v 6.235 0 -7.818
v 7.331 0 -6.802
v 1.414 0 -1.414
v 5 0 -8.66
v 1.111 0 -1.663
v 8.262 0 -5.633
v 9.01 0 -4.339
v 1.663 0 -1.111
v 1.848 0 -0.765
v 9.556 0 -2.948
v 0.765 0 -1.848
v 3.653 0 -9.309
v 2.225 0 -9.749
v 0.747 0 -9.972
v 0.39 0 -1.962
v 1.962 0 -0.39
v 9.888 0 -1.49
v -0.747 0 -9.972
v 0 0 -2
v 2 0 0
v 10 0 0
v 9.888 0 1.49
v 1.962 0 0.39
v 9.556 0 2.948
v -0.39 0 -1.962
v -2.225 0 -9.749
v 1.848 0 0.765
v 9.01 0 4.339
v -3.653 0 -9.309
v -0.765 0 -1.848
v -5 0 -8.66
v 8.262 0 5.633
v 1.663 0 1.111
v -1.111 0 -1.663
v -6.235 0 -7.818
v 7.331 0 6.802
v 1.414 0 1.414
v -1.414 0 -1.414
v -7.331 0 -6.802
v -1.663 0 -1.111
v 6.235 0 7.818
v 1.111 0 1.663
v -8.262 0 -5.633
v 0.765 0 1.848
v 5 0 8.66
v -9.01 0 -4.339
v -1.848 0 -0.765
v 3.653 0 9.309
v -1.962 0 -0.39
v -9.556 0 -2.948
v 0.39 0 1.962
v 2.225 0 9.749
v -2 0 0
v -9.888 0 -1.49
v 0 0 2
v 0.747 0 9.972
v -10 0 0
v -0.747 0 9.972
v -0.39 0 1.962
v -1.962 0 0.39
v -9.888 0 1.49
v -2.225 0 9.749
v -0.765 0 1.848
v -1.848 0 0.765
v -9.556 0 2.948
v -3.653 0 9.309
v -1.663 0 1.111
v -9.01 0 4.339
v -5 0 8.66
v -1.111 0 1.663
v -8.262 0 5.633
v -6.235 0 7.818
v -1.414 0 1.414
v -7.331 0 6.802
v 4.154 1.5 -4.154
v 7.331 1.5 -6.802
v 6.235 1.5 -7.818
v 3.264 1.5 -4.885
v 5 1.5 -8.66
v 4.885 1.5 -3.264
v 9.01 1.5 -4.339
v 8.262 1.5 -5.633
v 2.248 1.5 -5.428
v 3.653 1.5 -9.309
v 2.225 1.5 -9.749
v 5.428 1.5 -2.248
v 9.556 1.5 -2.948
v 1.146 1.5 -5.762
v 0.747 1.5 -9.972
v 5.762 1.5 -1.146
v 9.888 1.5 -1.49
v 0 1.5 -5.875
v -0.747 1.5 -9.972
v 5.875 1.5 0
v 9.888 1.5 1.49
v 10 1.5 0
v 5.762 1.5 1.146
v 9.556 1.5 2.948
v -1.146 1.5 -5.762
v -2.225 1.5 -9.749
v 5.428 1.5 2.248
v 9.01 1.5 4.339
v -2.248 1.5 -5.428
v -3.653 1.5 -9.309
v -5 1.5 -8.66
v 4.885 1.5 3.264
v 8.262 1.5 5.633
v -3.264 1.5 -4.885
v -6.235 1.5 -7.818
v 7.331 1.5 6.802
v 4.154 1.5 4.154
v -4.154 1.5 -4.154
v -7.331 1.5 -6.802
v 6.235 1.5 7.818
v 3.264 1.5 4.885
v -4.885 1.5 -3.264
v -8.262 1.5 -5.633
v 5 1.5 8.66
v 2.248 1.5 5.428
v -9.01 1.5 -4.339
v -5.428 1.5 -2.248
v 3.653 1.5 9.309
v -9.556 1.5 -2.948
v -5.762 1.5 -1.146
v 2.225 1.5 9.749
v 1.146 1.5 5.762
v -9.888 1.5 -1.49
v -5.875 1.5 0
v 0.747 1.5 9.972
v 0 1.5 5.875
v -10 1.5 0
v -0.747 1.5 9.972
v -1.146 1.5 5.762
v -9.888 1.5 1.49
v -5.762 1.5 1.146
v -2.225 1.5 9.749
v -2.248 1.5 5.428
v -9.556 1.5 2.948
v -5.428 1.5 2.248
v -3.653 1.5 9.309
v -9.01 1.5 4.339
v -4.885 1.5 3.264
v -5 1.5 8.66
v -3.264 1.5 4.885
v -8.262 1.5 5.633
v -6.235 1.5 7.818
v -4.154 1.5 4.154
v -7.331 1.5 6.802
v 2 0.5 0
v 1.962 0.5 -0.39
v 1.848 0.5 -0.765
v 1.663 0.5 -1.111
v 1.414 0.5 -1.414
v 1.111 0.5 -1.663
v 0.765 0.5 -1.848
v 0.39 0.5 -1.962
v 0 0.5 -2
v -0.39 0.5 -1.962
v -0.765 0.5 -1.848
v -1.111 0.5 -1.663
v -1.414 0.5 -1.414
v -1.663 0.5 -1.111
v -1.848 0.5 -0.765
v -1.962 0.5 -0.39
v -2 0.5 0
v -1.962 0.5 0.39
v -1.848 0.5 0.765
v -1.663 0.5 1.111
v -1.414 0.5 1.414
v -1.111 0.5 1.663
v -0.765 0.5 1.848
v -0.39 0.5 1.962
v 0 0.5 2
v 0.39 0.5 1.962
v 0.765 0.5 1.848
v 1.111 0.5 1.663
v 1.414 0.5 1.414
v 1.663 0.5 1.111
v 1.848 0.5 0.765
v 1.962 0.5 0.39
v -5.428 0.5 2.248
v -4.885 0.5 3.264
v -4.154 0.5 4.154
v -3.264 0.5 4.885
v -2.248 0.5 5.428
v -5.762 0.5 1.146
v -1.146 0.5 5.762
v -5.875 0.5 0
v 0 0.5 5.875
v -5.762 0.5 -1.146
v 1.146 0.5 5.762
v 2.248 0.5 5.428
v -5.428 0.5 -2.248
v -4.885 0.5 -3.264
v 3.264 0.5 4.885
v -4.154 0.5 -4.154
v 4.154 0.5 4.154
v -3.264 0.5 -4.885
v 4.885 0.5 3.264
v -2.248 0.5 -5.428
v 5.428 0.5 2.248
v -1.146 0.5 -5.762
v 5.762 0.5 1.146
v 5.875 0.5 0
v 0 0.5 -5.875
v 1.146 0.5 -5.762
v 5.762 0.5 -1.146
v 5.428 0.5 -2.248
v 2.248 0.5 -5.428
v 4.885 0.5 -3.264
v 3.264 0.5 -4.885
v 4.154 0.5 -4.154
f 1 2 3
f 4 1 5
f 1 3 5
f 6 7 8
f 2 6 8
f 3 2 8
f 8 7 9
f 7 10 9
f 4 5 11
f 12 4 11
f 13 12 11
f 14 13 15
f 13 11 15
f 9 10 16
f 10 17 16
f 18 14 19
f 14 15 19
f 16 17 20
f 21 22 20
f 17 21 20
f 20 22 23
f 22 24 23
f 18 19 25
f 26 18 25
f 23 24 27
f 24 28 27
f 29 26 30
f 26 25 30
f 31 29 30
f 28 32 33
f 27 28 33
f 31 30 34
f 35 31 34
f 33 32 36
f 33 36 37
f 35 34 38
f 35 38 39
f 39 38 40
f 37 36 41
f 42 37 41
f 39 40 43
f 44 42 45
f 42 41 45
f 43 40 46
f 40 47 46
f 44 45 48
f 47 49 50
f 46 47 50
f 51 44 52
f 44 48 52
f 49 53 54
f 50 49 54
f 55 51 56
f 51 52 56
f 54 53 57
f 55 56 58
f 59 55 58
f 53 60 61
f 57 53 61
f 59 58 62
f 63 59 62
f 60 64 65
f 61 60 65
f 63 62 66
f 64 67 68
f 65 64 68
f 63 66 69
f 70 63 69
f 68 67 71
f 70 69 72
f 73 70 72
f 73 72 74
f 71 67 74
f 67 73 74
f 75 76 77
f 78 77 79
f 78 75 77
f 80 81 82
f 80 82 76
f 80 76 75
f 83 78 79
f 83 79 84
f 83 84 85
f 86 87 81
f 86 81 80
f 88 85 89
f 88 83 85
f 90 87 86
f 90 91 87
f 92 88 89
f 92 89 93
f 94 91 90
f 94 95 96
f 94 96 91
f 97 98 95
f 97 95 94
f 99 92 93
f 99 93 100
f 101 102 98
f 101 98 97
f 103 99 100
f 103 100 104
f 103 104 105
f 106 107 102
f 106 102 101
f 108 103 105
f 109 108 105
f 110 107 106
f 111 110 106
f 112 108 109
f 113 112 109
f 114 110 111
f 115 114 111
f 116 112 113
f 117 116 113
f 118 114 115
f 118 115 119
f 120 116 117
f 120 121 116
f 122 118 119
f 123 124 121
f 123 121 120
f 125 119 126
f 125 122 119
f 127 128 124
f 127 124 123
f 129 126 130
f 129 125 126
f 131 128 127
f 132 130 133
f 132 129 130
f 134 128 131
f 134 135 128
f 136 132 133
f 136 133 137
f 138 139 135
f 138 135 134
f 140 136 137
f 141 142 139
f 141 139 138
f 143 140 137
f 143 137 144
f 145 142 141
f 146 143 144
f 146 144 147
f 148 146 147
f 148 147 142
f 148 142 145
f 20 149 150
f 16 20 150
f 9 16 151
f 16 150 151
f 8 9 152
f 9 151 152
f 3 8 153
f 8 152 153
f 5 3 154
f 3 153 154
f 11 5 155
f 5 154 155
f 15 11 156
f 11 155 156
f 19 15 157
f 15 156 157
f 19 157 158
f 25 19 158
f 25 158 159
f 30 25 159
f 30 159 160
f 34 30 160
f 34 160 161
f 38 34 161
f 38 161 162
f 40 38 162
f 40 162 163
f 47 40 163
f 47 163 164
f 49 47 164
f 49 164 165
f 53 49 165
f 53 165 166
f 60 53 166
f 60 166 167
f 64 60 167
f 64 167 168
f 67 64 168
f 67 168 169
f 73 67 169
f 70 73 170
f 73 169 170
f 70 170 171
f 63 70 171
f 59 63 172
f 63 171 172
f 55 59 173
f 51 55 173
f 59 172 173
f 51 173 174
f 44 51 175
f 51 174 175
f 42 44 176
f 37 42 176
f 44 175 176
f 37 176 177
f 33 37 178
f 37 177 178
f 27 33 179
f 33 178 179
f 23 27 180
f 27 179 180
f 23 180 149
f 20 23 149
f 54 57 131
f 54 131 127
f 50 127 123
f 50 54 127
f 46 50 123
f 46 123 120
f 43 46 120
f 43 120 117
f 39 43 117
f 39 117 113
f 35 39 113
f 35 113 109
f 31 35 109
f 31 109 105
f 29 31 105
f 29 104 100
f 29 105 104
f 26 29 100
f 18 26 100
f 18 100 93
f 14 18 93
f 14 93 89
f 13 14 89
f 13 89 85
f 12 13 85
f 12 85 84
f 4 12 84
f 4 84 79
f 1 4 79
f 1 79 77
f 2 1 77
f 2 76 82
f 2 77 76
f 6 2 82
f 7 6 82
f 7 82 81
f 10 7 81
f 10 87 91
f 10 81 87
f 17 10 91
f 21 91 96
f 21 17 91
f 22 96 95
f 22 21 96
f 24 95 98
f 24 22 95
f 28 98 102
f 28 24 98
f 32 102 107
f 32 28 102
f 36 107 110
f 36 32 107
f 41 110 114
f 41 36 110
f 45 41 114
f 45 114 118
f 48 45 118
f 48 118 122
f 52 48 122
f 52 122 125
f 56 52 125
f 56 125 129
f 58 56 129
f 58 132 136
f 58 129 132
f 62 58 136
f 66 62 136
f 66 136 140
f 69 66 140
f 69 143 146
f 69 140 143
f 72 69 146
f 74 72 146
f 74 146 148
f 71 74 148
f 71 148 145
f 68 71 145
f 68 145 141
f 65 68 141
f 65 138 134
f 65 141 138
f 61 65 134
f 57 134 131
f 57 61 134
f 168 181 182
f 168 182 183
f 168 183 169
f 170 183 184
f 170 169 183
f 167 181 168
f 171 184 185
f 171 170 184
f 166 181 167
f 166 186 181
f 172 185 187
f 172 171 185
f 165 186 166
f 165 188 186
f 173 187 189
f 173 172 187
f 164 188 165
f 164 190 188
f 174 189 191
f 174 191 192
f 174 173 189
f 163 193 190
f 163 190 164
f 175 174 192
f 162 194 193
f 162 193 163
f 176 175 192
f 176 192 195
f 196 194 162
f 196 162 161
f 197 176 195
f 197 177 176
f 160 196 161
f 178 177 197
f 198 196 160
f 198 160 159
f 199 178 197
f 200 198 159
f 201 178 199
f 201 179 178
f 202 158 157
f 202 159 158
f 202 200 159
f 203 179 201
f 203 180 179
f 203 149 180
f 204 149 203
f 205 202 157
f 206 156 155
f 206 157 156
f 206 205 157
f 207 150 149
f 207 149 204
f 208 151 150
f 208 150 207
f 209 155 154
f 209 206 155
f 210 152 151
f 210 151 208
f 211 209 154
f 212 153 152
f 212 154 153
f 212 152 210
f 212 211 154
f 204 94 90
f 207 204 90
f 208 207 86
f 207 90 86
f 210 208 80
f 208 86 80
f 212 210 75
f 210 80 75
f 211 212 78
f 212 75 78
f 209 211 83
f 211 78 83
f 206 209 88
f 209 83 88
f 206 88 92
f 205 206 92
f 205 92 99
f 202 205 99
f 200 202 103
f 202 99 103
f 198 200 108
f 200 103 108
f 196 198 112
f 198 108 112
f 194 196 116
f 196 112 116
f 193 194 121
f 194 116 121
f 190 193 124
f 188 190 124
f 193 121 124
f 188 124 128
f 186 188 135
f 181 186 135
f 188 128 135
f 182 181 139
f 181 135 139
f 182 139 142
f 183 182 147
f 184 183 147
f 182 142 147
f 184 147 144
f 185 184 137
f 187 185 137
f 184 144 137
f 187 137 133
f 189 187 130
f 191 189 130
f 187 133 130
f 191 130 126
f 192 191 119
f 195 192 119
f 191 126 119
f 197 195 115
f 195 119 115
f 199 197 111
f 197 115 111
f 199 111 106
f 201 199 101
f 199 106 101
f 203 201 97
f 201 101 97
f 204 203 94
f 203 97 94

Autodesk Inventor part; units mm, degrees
ref_plane "YZ Plane" through (0, 0, 0) normal (1, 0, 0) x (0, 1, 0)
ref_plane "XZ Plane" through (0, 0, 0) normal (0, 1, 0) x (-1, 0, 0)
ref_plane "XY Plane" through (0, 0, 0) normal (0, 0, 1) x (1, 0, 0)
sketch "Sketch1" plane through (0, 0, 0) normal (0, 1, 0) x (-1, 0, 0)
  circle A0 centre (0, 0) radius 10
  dimension "d0" = 20
extrude "Extrusion1" add sketch "Sketch1" along normal blind 1.5
sketch "Sketch2" plane through (0, 1.5, 0) normal (0, 1, 0) x (1, 0, 0)
  circle A0 centre (0, 0) radius 5.875
  dimension "d3" = 11.75
extrude "Extrusion2" cut sketch "Sketch2" against normal blind 1
sketch "Sketch3" plane through (0, 0.5, 0) normal (0, 1, 0) x (1, 0, 0)
  circle A0 centre (0, 0) radius 2
  dimension "d6" = 4
extrude "Extrusion3" cut sketch "Sketch3" against normal through all
properties part number "M3Bearing_Holder"
